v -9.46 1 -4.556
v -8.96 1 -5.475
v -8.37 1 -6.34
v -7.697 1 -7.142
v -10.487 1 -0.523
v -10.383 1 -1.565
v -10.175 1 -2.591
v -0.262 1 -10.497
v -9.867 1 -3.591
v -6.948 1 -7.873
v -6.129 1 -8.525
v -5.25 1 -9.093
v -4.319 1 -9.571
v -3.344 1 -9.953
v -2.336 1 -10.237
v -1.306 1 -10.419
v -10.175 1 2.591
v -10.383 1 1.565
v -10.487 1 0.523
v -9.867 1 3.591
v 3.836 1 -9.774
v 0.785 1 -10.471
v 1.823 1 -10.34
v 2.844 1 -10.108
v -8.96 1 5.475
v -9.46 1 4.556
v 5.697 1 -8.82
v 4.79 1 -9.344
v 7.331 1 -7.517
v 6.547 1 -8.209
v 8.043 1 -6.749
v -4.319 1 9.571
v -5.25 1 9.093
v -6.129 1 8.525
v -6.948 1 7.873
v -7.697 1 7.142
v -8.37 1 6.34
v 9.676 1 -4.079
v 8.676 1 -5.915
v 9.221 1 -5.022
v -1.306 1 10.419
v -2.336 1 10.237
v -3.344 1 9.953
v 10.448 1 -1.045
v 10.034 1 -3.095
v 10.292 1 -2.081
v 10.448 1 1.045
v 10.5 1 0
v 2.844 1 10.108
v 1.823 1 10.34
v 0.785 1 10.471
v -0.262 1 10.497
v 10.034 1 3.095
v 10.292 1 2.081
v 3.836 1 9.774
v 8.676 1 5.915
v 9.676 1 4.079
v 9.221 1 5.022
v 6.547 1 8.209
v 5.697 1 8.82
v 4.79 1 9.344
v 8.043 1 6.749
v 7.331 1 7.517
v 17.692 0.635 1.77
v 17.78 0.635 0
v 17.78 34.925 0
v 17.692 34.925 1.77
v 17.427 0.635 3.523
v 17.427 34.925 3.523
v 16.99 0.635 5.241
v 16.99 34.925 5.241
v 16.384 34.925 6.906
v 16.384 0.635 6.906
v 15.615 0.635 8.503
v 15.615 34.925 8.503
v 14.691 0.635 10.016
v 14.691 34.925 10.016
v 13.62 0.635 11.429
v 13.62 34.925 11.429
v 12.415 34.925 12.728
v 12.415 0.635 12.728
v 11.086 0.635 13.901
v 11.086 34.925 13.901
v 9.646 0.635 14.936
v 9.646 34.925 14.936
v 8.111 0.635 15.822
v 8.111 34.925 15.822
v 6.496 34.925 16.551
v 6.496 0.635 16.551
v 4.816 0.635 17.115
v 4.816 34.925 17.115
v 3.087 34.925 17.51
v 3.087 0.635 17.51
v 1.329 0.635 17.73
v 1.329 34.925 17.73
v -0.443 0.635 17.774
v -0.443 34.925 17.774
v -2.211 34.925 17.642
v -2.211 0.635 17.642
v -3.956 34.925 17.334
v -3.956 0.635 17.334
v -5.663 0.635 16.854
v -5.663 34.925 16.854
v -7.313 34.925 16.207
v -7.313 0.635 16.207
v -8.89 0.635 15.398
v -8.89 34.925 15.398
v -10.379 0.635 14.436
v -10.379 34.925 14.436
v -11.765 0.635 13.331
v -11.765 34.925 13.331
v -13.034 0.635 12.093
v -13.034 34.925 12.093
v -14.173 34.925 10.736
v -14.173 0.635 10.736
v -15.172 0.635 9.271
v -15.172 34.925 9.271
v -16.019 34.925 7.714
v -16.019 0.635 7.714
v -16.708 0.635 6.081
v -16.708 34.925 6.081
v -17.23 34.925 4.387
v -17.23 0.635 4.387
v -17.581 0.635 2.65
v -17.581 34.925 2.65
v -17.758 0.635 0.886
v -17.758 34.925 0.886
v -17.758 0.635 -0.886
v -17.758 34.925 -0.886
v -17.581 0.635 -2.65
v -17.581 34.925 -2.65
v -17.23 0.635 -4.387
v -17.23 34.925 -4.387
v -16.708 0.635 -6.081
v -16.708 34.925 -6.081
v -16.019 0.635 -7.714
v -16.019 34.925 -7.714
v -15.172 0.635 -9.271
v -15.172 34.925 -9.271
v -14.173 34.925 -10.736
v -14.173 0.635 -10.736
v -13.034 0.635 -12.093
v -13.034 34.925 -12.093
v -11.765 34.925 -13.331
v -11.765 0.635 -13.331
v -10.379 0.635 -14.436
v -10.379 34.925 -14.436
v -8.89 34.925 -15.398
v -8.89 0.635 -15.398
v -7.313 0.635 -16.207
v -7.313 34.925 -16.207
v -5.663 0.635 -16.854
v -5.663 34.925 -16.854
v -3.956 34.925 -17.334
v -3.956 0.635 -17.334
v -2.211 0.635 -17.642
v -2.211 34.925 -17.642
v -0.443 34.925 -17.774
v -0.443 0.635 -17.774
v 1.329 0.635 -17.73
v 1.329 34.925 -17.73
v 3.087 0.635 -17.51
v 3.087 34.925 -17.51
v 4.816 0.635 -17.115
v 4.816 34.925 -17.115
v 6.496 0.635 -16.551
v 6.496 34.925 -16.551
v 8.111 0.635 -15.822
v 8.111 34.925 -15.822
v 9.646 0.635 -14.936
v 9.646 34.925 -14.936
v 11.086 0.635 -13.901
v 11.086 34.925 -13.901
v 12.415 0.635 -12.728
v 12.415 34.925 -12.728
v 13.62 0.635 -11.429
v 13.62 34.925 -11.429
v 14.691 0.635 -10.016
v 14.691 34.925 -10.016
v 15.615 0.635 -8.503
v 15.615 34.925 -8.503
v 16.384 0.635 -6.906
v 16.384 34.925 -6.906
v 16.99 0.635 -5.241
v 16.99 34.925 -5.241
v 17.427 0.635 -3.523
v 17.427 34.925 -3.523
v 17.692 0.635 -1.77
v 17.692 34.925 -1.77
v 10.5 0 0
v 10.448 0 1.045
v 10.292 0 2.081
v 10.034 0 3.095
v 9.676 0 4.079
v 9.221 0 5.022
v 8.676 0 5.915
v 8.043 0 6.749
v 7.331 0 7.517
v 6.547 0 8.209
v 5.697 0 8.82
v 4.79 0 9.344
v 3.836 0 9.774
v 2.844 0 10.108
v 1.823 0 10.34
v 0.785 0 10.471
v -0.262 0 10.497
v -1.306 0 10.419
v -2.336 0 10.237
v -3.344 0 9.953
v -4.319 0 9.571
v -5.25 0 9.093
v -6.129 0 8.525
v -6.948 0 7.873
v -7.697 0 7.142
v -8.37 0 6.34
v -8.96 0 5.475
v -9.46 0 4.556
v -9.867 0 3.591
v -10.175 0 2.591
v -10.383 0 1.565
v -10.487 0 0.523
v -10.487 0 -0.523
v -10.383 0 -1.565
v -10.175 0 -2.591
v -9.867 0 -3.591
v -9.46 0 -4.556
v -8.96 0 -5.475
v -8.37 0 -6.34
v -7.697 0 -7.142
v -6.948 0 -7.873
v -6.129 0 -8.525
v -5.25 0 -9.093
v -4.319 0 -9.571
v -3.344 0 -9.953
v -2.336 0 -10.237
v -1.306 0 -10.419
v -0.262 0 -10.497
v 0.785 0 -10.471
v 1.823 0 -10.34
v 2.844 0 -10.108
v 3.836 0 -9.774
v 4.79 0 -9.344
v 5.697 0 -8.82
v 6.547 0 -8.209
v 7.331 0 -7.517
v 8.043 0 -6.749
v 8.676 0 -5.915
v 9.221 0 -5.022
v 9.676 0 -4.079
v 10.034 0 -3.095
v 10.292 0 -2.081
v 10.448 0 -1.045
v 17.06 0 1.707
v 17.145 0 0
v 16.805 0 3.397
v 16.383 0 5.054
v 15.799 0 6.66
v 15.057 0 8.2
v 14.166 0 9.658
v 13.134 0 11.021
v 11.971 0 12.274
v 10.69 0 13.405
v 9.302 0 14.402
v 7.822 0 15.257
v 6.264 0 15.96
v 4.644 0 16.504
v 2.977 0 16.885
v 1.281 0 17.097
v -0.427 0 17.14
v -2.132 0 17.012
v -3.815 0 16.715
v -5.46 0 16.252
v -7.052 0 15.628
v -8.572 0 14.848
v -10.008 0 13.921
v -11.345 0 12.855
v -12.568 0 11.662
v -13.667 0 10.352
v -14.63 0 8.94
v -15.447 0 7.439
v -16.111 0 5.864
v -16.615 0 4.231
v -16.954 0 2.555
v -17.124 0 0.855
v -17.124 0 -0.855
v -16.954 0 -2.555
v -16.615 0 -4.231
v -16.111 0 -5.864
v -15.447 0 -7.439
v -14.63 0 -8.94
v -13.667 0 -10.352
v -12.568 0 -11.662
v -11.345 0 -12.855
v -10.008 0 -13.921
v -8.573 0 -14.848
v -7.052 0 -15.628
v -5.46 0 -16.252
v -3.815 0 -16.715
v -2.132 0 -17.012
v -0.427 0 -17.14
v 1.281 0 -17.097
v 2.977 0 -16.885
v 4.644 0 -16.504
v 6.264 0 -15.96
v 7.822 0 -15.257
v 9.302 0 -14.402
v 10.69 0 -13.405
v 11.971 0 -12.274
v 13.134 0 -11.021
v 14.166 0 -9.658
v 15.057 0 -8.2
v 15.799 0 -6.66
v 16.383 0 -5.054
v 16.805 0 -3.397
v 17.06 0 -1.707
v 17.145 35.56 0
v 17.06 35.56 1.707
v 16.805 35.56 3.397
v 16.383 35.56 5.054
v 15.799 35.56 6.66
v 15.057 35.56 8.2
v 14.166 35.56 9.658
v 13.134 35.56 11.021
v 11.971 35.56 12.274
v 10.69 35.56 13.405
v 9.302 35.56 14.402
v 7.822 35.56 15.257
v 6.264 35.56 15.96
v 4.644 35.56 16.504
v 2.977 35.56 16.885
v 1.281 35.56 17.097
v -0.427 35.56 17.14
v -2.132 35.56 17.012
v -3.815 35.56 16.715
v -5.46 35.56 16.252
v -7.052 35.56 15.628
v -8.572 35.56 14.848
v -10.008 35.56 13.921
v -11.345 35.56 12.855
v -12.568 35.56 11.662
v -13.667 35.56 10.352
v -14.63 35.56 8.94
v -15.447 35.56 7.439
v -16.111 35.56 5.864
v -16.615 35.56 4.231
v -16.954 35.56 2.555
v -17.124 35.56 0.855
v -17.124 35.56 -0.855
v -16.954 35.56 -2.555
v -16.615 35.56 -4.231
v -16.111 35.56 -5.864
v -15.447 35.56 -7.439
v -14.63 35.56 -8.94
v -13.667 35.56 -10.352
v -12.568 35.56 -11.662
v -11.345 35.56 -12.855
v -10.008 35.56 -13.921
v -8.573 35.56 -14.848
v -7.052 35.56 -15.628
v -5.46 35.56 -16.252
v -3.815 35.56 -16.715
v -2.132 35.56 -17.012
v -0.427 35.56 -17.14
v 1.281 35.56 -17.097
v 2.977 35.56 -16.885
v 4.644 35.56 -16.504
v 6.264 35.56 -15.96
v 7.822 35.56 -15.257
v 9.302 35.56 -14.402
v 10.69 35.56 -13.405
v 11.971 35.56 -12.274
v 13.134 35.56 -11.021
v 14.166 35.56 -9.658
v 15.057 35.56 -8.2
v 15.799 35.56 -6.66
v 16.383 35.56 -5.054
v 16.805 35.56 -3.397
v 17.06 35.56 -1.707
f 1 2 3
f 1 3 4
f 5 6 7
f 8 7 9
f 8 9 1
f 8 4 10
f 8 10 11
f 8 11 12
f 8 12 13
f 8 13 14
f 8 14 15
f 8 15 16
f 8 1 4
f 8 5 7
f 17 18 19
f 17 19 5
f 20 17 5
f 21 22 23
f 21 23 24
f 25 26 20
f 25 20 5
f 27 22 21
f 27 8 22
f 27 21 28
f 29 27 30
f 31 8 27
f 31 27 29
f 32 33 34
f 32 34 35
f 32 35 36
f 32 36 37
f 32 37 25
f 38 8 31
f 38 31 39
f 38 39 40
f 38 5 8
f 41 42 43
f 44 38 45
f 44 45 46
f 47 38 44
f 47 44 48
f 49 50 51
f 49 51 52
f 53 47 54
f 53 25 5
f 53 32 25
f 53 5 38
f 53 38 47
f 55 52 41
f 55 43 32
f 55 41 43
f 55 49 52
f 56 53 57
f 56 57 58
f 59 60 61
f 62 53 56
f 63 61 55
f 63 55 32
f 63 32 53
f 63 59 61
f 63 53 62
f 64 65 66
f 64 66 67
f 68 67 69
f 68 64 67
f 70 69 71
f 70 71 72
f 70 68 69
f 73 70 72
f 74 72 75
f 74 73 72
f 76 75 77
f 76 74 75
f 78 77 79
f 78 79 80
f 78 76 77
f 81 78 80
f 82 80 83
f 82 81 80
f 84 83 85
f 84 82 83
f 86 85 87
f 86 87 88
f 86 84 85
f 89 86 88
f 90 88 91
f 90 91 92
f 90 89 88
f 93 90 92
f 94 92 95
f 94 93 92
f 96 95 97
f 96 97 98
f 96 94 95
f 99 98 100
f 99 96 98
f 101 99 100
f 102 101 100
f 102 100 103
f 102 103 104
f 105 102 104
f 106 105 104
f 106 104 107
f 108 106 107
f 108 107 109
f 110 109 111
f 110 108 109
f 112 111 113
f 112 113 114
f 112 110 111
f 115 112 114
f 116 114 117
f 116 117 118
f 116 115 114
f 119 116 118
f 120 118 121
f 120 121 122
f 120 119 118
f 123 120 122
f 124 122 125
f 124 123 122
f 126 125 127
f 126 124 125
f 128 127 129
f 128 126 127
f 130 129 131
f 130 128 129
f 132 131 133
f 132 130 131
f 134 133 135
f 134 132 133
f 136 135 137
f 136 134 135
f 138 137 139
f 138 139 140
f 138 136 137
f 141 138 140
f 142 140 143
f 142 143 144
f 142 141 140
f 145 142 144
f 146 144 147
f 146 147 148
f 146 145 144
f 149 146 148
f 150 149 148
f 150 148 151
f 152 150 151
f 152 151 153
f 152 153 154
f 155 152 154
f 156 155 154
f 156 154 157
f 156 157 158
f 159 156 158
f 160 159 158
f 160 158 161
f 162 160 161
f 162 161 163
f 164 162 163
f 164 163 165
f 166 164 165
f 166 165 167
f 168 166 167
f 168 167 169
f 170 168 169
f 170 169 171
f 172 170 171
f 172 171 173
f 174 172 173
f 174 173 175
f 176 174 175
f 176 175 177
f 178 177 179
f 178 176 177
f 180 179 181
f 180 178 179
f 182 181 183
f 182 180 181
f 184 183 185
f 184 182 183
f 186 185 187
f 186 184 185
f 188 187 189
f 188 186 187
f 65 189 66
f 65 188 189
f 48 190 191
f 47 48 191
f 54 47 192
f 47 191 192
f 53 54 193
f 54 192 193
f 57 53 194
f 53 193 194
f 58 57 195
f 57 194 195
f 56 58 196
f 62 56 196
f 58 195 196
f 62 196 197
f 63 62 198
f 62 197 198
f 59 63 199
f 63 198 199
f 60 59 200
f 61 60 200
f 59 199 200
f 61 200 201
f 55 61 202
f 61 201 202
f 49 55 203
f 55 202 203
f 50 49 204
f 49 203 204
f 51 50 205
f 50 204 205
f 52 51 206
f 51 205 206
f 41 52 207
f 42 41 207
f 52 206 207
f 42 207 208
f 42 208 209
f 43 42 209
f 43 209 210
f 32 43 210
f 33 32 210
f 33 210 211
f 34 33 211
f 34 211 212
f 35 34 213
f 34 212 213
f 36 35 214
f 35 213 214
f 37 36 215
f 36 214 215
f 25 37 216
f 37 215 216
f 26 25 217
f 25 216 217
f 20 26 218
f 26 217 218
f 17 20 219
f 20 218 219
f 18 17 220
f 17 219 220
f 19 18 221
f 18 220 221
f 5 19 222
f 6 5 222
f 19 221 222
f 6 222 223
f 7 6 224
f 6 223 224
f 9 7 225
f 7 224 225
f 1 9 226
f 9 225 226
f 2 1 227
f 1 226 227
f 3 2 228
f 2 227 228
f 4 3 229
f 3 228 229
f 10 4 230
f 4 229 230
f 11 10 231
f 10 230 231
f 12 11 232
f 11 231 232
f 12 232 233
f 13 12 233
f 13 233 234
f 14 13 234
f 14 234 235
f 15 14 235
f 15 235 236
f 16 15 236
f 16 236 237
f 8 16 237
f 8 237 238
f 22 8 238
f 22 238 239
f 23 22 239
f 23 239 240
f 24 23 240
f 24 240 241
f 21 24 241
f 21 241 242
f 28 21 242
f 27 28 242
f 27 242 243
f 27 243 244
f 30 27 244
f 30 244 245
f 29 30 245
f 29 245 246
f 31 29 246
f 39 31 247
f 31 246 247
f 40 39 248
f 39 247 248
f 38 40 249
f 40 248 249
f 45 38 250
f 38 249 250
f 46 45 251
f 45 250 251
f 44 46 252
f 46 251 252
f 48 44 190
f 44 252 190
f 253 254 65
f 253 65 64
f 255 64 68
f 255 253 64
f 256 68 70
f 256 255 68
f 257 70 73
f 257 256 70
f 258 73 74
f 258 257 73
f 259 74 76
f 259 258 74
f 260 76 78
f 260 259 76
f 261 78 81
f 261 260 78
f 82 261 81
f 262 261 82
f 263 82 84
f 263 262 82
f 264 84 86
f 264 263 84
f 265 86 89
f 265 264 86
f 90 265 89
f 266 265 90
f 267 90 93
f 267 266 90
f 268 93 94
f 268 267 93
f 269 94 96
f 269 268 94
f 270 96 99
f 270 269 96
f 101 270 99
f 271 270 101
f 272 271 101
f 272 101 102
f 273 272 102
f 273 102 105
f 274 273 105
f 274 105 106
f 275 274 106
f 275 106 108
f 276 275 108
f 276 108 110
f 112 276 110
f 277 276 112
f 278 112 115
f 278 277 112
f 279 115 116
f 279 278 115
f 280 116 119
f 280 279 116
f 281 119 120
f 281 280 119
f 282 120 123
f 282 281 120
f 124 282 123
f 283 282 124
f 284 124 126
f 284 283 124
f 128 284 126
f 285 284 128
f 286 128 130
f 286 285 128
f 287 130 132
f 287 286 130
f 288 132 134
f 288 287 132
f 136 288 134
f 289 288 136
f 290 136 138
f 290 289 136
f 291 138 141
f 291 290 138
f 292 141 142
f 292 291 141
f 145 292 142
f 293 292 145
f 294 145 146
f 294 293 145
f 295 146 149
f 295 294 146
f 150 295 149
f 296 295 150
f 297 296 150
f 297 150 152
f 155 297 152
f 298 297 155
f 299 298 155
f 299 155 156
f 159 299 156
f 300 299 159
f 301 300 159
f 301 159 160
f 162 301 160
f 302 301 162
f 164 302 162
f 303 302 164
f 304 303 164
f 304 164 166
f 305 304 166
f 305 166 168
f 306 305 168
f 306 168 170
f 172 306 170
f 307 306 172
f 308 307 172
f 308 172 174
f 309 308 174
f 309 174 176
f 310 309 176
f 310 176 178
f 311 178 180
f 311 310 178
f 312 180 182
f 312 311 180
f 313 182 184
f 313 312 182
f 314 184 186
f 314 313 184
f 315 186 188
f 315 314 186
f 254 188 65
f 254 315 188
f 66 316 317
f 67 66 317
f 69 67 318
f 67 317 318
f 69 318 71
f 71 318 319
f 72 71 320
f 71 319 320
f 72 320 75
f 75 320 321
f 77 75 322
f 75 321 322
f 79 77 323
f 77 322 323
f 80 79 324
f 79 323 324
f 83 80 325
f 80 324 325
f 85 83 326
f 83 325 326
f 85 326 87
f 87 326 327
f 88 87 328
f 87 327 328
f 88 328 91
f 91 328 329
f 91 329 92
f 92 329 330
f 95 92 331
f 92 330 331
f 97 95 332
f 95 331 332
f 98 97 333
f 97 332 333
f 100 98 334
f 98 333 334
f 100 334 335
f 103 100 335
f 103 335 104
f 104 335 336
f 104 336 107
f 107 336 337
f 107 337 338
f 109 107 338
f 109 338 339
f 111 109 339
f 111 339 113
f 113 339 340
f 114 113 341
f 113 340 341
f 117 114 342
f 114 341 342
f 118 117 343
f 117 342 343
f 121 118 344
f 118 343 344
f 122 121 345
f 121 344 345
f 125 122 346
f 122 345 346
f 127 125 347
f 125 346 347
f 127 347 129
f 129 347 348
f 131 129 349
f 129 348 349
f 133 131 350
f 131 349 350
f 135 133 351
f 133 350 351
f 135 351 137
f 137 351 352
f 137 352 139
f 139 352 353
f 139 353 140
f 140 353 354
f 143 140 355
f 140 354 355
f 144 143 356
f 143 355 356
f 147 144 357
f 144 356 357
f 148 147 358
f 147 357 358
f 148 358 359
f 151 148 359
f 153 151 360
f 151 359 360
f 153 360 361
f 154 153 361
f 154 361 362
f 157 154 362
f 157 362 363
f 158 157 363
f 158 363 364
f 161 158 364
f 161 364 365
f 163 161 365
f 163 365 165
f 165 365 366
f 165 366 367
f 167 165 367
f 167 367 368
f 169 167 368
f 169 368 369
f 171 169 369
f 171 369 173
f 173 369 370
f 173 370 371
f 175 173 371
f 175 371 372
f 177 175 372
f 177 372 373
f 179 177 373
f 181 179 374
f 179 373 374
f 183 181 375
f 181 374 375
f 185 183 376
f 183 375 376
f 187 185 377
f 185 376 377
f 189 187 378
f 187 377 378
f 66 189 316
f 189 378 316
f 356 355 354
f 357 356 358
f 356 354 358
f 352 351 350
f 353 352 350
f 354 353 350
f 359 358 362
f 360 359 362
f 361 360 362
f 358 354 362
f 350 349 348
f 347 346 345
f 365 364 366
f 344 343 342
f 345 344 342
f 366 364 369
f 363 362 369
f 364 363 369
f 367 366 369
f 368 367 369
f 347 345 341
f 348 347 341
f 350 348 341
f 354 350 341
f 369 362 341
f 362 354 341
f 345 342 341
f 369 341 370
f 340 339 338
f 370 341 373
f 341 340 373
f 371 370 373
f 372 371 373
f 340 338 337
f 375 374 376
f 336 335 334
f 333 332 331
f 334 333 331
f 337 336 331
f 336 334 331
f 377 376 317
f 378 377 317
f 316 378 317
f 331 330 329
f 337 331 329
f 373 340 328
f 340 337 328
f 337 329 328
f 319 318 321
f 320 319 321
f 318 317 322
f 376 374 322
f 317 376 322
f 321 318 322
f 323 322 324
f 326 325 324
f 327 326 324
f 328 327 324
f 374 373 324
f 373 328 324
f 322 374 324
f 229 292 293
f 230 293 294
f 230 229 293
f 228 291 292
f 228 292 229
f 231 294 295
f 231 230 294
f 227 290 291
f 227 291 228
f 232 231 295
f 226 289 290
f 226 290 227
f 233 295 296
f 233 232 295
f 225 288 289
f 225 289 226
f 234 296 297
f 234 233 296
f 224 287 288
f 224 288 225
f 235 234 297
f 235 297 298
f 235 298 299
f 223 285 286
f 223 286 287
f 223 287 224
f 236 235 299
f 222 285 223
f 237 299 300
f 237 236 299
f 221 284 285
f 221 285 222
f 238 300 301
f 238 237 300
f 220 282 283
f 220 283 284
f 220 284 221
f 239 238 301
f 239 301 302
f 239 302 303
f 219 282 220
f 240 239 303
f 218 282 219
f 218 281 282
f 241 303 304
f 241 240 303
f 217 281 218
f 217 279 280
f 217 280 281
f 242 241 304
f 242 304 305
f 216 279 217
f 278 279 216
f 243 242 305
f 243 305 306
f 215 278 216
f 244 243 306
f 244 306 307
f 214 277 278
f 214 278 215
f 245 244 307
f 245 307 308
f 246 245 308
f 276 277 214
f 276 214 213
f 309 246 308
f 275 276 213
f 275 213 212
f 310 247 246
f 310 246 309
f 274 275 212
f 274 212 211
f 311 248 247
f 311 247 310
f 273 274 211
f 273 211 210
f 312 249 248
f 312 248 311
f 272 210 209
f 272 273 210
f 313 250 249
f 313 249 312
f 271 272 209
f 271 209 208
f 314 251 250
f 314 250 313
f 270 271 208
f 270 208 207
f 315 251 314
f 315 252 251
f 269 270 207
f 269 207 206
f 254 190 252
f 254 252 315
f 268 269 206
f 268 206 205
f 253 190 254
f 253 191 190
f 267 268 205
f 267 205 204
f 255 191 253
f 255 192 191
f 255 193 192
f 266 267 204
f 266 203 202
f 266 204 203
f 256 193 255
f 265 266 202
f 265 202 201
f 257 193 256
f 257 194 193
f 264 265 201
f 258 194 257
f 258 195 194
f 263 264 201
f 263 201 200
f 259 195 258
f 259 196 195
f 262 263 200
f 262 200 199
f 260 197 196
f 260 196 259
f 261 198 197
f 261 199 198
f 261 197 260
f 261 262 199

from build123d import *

# Parameters (mm, degrees)
SKETCH1_R           = 17.78
BOSS_EXTRUDE1_DEPTH = 35.56
SKETCH2_R           = 10.5
CUT_EXTRUDE1_DEPTH  = 1
CHAMFER1_SIZE       = 0.635
CHAMFER2_SIZE       = 0.635


with BuildPart() as part:
    # Sketch1 → Boss-Extrude1 (new body)
    with BuildSketch(Plane.XZ):
        Circle(SKETCH1_R)
    extrude(amount=-BOSS_EXTRUDE1_DEPTH)

    # Sketch2 → Cut-Extrude1 (cut)
    with BuildSketch(Plane.XZ):
        Circle(SKETCH2_R)
    extrude(amount=-CUT_EXTRUDE1_DEPTH, mode=Mode.SUBTRACT)

    # Chamfer1
    chamfer1_edges = [part.edges().sort_by_distance(p)[0] for p in [
        (-17.78, 0, 0),
    ]]
    chamfer(chamfer1_edges, length=CHAMFER1_SIZE)

    # Chamfer2
    chamfer2_edges = [part.edges().sort_by_distance(p)[0] for p in [
        (-17.78, 35.56, 0),
    ]]
    chamfer(chamfer2_edges, length=CHAMFER2_SIZE)


solid = part.part
